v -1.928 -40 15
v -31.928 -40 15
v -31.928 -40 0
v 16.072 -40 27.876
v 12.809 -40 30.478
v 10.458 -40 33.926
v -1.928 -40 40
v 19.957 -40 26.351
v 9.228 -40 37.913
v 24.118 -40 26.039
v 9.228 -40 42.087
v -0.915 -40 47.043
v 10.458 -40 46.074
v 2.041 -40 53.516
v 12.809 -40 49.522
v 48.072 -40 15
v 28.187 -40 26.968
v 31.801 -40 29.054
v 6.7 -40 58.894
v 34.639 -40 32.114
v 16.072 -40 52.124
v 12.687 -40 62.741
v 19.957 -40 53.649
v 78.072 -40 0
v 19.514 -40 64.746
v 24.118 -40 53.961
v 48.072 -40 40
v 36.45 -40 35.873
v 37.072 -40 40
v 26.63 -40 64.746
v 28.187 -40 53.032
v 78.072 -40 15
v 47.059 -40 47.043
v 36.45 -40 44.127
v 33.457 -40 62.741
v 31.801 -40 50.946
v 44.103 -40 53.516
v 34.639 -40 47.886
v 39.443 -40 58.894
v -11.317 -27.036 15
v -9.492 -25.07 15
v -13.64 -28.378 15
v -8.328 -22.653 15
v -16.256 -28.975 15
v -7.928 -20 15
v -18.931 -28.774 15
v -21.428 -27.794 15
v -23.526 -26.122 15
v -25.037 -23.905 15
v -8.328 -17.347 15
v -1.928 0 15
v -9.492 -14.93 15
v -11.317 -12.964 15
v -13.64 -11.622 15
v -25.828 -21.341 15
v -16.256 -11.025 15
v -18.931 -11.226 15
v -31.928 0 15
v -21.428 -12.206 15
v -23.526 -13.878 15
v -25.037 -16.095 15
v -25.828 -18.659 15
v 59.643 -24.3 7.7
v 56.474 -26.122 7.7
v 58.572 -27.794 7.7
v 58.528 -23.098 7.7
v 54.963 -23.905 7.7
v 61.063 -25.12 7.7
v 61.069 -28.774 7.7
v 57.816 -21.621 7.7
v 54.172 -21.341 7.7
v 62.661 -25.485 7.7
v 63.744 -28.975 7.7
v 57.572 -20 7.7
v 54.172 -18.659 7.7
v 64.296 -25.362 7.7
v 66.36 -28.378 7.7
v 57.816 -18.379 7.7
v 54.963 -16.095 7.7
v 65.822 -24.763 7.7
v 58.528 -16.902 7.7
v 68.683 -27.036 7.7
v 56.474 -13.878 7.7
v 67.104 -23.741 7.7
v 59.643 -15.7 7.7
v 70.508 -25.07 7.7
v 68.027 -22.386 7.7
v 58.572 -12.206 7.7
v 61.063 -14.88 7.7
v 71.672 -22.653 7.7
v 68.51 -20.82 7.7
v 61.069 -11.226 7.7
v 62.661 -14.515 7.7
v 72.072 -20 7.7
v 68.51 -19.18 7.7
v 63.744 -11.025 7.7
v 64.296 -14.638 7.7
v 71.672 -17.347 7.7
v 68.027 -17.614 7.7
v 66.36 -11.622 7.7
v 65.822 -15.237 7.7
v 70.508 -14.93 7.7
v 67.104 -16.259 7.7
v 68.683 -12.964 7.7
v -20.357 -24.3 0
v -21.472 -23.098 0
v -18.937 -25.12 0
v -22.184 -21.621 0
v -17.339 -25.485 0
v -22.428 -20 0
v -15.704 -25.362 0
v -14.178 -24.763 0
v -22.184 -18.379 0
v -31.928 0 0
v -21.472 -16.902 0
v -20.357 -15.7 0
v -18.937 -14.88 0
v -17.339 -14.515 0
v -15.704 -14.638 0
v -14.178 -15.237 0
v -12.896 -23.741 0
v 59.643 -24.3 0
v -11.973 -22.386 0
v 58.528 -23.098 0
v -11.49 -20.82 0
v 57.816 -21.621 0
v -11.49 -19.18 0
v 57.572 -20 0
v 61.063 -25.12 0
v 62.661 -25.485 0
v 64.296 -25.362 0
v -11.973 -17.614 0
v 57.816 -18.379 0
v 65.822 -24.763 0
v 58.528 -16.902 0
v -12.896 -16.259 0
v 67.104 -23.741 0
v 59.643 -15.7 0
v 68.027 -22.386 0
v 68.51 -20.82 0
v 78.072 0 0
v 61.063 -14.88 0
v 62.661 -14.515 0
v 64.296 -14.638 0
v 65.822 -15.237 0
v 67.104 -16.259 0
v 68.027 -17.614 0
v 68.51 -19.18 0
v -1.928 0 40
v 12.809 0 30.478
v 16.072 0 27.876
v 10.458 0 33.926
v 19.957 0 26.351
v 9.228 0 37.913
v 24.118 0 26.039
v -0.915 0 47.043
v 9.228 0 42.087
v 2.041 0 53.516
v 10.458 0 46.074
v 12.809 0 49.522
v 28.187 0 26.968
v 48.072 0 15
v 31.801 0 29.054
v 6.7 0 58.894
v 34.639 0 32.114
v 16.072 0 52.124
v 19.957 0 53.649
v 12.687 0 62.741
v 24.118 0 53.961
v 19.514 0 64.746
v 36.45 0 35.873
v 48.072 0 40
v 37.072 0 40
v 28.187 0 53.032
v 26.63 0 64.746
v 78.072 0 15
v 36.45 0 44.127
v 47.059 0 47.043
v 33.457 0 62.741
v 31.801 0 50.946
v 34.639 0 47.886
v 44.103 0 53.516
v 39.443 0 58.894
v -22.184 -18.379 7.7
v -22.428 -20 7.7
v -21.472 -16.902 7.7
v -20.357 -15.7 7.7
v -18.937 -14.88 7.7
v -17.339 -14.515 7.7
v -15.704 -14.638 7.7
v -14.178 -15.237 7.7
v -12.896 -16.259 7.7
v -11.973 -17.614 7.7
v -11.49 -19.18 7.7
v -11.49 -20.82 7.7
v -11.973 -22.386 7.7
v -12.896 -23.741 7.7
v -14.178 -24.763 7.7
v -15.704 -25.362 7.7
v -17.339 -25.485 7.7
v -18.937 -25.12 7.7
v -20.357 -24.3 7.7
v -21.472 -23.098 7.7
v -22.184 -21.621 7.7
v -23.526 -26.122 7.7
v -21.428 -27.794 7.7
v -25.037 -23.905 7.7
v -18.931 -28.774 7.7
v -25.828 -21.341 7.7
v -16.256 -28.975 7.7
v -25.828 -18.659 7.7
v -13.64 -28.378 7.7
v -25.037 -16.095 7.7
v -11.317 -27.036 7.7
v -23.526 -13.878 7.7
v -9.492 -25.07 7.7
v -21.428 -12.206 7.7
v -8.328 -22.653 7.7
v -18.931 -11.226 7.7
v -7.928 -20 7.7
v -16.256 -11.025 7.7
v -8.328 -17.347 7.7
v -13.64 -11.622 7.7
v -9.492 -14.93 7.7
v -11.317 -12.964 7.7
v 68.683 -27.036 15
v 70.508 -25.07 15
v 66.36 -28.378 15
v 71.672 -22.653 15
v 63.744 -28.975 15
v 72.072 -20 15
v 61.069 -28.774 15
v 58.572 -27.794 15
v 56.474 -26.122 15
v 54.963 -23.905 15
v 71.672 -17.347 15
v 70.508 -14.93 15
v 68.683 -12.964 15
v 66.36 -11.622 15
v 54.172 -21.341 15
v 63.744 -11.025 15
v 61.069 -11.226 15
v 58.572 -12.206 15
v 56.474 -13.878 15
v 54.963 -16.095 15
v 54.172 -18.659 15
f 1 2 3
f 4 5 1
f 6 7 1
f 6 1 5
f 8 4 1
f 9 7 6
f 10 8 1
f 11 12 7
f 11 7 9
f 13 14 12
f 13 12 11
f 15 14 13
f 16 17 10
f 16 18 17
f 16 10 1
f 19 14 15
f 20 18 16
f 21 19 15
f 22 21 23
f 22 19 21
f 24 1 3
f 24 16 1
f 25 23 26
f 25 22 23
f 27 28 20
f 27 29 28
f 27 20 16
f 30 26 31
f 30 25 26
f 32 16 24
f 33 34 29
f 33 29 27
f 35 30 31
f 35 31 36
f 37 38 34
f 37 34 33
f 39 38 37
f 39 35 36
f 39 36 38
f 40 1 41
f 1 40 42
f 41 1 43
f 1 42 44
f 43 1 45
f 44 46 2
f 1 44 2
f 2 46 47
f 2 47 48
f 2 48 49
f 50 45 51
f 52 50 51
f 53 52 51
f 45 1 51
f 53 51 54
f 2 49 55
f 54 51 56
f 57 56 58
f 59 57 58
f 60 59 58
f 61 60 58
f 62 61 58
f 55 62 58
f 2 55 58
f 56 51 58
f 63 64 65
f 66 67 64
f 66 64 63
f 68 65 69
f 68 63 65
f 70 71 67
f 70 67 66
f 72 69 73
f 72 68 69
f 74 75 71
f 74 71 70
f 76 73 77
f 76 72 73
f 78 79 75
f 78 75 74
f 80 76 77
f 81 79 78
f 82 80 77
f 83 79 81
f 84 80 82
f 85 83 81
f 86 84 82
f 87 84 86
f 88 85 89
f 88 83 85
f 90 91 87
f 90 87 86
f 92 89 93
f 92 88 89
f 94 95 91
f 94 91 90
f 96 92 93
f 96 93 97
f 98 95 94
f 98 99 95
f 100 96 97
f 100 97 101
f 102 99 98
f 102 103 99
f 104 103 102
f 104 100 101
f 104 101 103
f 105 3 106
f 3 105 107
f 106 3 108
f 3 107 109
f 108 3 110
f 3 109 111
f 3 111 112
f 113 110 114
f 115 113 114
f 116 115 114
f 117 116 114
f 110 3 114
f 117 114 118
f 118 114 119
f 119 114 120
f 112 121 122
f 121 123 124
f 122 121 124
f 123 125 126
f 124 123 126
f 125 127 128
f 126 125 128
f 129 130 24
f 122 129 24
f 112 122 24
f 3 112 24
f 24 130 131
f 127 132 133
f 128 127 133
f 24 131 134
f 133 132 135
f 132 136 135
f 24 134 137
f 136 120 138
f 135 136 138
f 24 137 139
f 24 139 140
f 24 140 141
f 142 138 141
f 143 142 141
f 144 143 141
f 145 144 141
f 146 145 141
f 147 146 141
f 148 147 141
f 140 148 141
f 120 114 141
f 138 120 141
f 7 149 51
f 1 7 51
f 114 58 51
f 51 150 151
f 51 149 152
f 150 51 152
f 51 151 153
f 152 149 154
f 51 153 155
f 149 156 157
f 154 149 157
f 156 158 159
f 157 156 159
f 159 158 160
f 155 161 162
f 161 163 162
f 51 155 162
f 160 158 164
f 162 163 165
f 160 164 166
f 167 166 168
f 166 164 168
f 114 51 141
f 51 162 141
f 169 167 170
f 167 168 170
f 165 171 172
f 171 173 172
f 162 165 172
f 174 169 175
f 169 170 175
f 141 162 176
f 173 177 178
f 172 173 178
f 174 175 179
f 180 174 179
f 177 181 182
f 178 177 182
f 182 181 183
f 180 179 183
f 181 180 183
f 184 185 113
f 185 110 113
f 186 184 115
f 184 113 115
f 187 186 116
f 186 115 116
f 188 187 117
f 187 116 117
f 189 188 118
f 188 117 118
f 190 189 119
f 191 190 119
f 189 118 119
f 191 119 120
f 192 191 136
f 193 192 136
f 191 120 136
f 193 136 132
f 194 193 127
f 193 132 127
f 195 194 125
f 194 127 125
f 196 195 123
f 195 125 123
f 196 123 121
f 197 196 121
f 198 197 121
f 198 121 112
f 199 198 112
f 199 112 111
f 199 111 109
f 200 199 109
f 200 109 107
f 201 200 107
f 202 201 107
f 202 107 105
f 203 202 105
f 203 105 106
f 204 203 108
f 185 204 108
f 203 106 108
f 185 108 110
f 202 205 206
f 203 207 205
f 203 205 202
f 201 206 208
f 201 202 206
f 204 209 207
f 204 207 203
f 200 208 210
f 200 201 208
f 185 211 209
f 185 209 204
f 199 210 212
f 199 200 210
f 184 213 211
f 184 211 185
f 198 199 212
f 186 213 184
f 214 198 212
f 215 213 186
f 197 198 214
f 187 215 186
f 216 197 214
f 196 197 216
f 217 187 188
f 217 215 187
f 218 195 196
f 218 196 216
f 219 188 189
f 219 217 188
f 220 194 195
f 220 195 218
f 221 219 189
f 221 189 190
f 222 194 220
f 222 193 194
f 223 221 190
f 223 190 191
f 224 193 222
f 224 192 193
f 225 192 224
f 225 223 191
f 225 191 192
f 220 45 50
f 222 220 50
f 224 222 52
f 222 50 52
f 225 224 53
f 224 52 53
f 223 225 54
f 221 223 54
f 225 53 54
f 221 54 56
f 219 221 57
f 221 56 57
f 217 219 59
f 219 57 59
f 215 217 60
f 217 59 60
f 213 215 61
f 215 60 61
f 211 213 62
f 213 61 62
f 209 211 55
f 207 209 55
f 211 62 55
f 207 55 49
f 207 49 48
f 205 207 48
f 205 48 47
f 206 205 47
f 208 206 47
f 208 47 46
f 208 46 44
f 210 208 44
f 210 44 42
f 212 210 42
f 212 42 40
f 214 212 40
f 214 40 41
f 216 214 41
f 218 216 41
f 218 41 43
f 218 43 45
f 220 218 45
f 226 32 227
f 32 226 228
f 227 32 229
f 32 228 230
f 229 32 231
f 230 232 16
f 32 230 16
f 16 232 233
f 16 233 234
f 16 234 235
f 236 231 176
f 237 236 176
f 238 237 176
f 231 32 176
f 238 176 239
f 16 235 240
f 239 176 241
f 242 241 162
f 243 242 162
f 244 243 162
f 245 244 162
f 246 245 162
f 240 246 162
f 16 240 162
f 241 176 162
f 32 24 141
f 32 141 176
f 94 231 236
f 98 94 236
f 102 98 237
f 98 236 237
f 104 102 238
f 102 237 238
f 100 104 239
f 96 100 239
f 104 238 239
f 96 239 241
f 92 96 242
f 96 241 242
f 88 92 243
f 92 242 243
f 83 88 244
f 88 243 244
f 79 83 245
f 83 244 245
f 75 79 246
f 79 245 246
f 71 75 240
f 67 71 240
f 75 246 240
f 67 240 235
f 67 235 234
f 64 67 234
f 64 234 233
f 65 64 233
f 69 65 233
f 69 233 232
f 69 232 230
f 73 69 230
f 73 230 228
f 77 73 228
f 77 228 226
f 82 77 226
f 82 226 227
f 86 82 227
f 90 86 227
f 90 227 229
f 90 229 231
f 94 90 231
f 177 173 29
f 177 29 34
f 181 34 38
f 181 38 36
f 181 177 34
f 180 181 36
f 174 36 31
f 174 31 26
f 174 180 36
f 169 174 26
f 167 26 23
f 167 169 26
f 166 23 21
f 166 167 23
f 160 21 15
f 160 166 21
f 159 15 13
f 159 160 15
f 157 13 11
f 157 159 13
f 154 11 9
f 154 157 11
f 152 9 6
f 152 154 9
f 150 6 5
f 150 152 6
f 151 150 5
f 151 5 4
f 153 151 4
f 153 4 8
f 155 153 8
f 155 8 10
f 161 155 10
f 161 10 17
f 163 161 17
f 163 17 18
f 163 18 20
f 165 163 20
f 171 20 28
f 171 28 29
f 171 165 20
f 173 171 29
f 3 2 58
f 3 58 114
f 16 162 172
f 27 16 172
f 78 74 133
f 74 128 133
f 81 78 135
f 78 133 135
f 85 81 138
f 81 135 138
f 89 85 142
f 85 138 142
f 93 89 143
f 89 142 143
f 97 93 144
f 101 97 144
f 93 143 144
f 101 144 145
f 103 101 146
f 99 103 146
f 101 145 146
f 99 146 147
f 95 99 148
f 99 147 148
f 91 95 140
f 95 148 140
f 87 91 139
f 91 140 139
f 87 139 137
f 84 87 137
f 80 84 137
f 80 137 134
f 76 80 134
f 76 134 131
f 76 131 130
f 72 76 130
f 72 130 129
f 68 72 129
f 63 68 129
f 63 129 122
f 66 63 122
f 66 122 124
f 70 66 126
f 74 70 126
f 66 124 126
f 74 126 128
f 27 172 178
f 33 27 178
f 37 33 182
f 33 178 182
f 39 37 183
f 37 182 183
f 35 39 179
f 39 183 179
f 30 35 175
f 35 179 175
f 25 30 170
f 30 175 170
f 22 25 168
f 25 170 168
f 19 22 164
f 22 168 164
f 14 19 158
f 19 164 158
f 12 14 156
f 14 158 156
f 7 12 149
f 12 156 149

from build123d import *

# Parameters (mm, degrees)
F0_R           = 14
F1_DEPTH       = 40
F4_D           = 11
F4_CBORE_D     = 18
F4_CBORE_DEPTH = 7.3


with BuildPart() as f1:
    # F0 (on Front) → F1 (new body)
    with BuildSketch(Plane.XZ):
        with BuildLine():
            Line((-31.928091, 15), (-31.928091, 7.7))
            Line((-31.928091, 7.7), (-31.928091, 0))
            Line((-31.928091, 0), (78.071909, 0))
            Line((78.071909, 0), (78.071909, 7.7))
            Line((78.071909, 7.7), (78.071909, 15))
            Line((78.071909, 15), (48.071909, 15))
            Line((48.071909, 15), (48.071909, 27.340618))
            Line((48.071909, 27.340618), (48.071909, 40))
            ThreePointArc((48.071909, 40), (23.071909, 65), (-1.928091, 40))
            Line((-1.928091, 40), (-1.928091, 27.340618))
            Line((-1.928091, 27.340618), (-1.928091, 15))
            Line((-1.928091, 15), (-31.928091, 15))
        make_face()
        with Locations((23.071909, 40)):
            Circle(F0_R, mode=Mode.SUBTRACT)
    extrude(amount=F1_DEPTH)

    # F4 (through all)
    with Locations(Plane.XY.offset(15)):
        with Locations((-16.928091, -20), (63.071909, -20)):
            CounterBoreHole(F4_D / 2, F4_CBORE_D / 2, F4_CBORE_DEPTH)


solid = f1.part
